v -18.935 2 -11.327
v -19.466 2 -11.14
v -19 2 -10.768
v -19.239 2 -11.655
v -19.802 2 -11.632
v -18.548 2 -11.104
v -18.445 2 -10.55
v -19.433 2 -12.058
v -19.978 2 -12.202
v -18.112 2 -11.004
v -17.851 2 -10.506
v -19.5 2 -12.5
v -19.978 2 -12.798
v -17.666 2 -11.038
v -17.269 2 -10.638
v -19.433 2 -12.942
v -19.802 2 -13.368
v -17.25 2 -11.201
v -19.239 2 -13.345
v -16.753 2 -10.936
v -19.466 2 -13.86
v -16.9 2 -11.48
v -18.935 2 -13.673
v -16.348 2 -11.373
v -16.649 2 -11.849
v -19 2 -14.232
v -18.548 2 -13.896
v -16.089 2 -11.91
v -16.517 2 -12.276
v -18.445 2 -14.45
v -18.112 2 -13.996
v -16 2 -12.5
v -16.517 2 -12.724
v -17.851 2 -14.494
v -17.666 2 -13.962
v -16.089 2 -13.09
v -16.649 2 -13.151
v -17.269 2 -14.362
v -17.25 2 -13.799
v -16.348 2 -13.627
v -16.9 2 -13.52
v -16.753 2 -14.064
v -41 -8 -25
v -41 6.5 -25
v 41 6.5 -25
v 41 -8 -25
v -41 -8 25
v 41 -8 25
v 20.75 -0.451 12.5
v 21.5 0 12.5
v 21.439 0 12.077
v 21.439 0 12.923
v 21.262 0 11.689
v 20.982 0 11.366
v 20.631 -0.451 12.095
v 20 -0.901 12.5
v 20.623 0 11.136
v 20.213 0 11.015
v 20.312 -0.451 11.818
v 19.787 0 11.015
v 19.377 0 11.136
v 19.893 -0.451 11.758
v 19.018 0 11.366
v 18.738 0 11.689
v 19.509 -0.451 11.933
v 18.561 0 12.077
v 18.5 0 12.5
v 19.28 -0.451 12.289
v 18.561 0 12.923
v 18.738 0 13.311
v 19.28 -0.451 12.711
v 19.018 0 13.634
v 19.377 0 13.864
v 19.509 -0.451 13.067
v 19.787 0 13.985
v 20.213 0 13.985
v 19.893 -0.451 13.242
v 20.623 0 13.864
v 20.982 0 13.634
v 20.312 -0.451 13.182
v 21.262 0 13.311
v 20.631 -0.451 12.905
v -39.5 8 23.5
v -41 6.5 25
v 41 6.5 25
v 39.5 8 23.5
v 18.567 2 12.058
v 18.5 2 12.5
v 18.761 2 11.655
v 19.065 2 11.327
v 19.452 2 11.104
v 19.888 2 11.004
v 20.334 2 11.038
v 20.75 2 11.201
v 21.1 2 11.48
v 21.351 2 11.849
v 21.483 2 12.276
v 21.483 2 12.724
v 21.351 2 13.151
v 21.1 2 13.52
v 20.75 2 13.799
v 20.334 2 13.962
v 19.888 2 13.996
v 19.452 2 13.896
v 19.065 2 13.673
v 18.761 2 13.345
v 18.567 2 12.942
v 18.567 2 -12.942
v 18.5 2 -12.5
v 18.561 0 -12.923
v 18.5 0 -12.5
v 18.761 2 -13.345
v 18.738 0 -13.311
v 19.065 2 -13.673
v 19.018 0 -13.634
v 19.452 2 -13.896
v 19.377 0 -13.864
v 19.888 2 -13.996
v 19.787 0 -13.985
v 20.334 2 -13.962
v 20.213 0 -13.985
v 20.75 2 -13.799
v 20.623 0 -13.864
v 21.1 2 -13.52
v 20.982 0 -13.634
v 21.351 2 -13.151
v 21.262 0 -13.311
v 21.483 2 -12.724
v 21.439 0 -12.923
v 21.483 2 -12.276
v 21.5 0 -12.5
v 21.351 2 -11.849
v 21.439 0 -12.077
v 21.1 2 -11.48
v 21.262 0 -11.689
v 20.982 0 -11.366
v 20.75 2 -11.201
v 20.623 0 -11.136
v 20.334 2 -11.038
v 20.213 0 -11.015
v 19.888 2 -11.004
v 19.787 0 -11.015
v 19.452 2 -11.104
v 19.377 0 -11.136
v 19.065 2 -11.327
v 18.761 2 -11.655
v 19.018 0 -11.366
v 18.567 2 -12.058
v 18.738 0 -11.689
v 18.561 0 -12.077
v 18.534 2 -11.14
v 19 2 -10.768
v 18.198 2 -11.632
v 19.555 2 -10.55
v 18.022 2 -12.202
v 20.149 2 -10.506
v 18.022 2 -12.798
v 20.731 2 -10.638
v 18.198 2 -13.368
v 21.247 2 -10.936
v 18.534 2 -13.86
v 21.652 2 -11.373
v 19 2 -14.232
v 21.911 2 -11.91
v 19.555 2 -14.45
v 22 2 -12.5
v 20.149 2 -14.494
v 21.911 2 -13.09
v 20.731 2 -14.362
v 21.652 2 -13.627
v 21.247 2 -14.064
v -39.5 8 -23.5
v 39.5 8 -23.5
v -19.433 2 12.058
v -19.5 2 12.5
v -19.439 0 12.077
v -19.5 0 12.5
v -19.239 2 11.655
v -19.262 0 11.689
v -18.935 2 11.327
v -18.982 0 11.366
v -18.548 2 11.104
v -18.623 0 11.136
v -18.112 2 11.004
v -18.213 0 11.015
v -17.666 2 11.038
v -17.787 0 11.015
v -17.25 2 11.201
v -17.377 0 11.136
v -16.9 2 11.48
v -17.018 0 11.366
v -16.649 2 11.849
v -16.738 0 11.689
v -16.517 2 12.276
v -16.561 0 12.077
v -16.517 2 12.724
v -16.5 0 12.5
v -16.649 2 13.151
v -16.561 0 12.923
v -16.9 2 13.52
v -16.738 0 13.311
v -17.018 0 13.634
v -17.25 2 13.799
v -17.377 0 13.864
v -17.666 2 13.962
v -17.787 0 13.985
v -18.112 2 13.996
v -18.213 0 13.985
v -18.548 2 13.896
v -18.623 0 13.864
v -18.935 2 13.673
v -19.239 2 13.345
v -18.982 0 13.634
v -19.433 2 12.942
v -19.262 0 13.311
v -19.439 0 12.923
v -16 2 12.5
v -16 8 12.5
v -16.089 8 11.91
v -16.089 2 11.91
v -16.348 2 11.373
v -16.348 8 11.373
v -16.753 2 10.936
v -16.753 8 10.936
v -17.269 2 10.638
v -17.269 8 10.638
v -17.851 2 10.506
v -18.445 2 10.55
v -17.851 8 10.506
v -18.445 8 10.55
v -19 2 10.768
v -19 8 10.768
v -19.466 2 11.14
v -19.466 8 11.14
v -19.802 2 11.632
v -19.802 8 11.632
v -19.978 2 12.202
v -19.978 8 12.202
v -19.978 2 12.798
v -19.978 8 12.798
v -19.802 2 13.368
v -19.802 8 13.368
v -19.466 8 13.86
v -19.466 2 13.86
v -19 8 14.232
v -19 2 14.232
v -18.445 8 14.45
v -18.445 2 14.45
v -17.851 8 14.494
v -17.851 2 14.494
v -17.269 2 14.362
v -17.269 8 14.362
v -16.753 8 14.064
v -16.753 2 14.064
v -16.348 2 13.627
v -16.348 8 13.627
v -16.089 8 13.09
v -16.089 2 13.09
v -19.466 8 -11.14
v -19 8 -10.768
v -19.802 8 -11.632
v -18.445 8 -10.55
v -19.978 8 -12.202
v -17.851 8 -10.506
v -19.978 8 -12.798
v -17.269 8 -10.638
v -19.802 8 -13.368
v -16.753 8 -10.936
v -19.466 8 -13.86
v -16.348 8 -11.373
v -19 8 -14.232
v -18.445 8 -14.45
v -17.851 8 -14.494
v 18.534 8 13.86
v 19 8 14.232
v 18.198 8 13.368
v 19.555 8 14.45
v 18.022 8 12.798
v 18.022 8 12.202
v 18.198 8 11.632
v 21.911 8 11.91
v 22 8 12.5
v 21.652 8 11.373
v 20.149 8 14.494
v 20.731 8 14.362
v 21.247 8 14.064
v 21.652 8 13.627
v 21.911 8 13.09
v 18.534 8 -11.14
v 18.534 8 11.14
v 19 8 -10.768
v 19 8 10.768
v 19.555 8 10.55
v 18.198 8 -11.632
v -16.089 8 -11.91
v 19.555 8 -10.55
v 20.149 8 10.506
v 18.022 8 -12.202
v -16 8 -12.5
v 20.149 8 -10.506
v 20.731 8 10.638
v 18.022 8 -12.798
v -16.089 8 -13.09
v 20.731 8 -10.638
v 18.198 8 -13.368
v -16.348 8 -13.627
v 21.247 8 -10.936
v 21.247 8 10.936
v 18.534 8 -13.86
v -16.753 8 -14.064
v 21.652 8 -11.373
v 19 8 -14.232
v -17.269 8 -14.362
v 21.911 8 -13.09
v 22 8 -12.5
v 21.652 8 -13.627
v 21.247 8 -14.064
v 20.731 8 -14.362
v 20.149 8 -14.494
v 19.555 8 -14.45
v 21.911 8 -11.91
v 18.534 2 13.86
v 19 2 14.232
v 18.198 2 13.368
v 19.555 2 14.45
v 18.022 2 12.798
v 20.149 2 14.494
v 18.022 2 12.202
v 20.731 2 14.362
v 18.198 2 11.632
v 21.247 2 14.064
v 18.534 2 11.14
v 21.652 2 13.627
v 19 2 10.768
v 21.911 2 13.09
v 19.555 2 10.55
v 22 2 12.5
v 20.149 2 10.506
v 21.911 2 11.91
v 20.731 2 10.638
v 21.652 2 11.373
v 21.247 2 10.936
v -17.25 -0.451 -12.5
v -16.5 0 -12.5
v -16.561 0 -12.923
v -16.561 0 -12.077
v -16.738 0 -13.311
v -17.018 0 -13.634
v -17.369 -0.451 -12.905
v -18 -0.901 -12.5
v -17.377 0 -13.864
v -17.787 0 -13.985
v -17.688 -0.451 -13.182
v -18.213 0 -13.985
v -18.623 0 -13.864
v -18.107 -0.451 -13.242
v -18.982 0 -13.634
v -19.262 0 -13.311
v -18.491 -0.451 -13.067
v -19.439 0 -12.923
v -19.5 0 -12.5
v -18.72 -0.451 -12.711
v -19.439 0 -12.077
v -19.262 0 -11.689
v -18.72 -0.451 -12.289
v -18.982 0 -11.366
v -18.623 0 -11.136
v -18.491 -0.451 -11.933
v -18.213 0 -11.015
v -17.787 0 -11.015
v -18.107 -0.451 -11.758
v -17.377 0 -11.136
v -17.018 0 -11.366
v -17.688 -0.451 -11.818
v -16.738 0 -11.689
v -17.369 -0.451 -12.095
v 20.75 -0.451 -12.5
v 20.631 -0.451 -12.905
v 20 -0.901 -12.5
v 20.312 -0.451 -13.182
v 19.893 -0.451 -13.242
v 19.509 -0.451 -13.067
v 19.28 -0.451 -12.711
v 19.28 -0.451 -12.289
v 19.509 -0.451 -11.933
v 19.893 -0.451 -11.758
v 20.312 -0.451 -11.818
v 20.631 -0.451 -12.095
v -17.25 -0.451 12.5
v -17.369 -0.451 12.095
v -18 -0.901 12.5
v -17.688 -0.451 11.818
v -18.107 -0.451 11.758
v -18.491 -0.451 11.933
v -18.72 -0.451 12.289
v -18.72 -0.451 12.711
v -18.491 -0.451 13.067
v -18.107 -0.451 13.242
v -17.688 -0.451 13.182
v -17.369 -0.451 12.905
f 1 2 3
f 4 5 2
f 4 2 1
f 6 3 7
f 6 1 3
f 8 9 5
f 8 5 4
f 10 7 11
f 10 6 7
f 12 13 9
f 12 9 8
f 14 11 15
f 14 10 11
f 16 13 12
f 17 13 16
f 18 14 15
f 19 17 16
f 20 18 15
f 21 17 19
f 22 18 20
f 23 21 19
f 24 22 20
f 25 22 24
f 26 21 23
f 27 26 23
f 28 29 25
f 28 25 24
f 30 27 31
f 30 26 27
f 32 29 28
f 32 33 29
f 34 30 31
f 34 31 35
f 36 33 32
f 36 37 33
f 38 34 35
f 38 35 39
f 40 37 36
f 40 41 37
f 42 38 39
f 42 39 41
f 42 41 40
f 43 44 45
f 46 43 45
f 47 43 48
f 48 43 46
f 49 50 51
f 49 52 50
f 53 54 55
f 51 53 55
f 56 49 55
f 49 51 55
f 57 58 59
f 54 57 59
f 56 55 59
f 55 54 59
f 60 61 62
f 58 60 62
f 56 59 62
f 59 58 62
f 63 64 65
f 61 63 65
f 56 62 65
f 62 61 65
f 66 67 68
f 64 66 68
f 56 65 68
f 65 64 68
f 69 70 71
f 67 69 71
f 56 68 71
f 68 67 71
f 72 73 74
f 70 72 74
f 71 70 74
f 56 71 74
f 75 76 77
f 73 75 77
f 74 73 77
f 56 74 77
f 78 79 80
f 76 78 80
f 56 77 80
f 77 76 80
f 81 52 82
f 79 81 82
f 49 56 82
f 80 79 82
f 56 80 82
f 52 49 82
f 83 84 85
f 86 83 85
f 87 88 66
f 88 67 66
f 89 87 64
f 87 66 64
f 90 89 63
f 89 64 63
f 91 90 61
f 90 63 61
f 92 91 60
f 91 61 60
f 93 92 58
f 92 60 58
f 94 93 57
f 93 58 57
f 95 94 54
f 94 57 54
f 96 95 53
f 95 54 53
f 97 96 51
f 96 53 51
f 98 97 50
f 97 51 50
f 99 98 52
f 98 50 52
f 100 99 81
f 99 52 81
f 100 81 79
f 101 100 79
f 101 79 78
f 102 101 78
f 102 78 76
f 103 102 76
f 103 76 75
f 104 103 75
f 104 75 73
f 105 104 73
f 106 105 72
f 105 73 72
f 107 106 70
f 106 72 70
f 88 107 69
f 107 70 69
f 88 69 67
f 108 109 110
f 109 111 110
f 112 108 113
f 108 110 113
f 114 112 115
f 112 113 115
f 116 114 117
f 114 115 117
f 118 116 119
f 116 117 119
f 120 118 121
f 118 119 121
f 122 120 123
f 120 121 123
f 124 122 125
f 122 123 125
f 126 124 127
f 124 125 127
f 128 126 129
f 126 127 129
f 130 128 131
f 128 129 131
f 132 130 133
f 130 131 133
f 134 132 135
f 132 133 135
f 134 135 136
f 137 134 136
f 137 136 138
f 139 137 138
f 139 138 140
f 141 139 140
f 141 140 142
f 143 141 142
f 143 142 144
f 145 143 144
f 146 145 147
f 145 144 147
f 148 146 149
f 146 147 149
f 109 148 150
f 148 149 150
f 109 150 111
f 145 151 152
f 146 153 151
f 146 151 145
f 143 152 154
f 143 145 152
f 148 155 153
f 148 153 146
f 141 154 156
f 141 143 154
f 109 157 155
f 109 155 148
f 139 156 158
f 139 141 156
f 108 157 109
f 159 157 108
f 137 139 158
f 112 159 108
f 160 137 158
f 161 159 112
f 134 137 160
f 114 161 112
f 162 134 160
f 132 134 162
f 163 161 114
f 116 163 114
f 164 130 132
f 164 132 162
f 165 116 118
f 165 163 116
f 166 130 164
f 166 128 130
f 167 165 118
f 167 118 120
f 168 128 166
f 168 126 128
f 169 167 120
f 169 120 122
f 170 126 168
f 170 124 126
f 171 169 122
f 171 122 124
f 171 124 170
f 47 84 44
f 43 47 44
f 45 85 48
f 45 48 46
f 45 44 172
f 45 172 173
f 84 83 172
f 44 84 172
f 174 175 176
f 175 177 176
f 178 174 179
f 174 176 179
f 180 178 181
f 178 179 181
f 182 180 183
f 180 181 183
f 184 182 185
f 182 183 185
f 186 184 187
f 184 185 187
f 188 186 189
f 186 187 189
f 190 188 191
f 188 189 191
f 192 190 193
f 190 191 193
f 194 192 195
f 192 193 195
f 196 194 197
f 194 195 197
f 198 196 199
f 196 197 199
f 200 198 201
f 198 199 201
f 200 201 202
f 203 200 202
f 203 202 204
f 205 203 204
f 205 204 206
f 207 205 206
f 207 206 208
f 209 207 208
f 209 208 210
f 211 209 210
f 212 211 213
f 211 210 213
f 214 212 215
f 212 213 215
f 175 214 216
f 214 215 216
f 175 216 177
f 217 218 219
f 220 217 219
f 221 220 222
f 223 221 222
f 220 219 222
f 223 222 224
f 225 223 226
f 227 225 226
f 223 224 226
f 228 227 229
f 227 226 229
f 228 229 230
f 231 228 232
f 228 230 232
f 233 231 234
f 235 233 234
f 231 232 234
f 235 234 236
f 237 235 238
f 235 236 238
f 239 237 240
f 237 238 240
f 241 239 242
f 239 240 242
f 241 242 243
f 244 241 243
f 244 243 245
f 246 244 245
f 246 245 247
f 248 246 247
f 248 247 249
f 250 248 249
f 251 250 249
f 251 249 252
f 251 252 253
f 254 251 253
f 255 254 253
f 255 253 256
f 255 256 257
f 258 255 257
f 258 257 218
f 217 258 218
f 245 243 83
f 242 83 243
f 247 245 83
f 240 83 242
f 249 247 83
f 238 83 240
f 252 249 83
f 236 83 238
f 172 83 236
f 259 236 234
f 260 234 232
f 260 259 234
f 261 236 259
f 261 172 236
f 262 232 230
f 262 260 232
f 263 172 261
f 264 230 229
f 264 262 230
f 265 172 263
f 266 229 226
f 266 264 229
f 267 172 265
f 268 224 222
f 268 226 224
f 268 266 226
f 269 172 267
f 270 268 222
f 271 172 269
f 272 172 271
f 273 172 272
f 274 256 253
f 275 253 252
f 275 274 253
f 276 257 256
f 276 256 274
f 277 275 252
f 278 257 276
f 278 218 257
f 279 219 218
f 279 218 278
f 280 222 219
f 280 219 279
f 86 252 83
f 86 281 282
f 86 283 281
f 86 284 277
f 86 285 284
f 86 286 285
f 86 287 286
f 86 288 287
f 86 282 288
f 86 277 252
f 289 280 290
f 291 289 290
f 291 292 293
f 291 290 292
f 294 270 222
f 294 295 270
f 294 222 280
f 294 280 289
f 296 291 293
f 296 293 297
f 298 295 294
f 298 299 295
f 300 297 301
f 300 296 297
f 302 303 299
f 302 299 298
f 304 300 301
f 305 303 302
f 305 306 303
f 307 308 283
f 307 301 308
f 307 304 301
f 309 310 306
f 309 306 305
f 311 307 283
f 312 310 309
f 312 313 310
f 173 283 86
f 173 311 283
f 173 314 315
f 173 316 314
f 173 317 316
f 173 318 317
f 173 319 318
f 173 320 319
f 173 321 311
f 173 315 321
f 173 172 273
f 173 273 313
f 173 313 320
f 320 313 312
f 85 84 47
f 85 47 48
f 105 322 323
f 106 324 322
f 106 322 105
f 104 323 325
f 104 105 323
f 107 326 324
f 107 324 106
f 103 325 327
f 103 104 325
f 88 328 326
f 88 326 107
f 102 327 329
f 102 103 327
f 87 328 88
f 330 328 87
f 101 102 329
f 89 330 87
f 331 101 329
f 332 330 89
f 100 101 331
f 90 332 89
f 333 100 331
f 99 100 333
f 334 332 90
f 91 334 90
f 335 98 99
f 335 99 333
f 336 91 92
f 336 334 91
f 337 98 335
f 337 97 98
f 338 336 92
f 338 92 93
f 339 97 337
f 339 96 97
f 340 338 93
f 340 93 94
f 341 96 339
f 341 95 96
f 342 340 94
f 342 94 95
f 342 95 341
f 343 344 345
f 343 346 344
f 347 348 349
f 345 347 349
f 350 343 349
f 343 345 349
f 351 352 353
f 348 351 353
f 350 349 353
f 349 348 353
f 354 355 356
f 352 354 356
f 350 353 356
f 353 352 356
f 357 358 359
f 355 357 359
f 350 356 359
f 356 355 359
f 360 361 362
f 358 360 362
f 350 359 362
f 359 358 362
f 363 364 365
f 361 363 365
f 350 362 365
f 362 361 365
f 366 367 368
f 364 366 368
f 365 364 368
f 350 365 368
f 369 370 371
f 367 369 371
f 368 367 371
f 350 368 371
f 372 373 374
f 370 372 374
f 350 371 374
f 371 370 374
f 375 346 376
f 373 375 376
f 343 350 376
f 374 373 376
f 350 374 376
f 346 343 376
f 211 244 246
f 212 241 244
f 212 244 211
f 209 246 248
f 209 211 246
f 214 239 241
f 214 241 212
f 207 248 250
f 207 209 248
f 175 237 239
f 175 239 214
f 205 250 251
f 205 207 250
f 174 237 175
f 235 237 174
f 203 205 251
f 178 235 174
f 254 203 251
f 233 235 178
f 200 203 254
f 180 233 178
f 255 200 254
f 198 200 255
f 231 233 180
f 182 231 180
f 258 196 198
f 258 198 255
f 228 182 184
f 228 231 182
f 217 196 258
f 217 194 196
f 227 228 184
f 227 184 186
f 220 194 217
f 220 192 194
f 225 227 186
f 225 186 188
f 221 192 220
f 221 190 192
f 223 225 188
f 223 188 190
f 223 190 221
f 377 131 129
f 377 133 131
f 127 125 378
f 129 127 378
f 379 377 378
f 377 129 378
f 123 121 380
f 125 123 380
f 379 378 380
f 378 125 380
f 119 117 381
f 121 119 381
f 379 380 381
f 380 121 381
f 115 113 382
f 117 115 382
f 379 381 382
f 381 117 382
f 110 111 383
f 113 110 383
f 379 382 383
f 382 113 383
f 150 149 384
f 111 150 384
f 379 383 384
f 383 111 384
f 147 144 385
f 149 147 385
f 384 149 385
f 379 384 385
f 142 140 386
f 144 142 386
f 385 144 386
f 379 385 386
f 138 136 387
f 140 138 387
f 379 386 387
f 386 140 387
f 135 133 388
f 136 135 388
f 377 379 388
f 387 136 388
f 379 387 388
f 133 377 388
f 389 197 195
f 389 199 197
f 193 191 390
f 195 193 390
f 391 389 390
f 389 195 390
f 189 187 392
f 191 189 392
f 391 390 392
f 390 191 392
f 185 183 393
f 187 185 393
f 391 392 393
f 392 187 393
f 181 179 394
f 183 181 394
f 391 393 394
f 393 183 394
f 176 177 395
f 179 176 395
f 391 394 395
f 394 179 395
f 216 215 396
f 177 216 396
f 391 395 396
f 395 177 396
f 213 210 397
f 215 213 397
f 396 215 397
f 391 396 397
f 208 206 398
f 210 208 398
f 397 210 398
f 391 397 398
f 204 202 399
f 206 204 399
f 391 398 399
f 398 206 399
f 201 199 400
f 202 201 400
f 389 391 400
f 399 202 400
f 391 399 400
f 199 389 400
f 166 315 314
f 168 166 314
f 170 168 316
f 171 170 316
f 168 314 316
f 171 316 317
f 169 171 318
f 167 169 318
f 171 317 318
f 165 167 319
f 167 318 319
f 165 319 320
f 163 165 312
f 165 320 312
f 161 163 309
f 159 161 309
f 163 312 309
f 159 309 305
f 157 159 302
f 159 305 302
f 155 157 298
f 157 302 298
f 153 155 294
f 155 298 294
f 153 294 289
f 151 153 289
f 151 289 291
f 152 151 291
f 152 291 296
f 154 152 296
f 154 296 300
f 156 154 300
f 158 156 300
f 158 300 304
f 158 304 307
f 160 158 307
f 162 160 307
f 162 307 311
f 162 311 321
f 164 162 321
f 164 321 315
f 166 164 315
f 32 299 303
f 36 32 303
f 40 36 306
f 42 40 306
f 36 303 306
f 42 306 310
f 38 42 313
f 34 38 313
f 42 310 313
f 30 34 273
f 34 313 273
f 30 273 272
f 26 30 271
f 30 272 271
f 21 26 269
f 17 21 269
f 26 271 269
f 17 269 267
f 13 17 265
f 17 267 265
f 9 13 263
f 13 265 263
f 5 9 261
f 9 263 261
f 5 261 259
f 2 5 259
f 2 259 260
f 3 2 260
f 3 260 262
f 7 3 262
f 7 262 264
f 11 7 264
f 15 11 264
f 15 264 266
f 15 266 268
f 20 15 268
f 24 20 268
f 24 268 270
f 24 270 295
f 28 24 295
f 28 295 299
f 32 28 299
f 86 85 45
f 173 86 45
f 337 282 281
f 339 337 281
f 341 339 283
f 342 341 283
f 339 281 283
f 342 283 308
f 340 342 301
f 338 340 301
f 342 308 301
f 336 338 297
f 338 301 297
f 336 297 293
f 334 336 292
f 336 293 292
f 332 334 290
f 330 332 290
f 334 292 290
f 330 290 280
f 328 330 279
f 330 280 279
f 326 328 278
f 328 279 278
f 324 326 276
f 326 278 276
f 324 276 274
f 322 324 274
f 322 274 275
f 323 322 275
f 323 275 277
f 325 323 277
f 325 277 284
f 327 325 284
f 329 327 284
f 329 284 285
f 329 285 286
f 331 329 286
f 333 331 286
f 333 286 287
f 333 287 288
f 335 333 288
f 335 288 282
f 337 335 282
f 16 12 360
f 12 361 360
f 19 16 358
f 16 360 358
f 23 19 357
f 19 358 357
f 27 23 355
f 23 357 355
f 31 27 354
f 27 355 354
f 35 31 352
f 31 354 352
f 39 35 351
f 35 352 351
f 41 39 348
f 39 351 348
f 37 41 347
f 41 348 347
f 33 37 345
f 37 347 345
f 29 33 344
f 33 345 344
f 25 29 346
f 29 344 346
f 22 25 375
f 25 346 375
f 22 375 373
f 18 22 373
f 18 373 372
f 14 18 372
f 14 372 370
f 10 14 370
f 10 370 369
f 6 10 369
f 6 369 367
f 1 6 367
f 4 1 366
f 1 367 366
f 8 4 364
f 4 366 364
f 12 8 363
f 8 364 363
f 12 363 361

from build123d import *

# Parameters (mm, degrees)
SKETCH1_W                               = 82
SKETCH1_H                               = 50
BOSS_EXTRUDE1_DEPTH                     = 8
CHAMFER1_SIZE                           = 1.5
CBORE_FOR_M5_HEX_HEAD_BOLT1_D           = 3
CBORE_FOR_M5_HEX_HEAD_BOLT1_DEPTH       = 8
CBORE_FOR_M5_HEX_HEAD_BOLT1_CBORE_D     = 4
CBORE_FOR_M5_HEX_HEAD_BOLT1_CBORE_DEPTH = 6
CBORE_FOR_M5_HEX_HEAD_BOLT1_TIP         = 0.901290929


with BuildPart() as part:
    # Sketch1 → Boss-Extrude1 (new, symmetric)
    with BuildSketch(Plane(origin=(0, 0, 0), x_dir=(1, 0, 0), z_dir=(0, 1, 0))):
        Rectangle(SKETCH1_W, SKETCH1_H)
    extrude(amount=BOSS_EXTRUDE1_DEPTH, both=True)

    # Chamfer1
    chamfer1_edges = [part.edges().sort_by_distance(p)[0] for p in [
        (41, 8, 0),
        (0, 8, -25),
        (-41, 8, 0),
        (0, 8, 25),
    ]]
    chamfer(chamfer1_edges, length=CHAMFER1_SIZE)

    # CBORE for M5 Hex Head Bolt1
    with Locations(Plane(origin=(0, 8, 0), x_dir=(1, 0, 0), z_dir=(0, 1, 0))):
        with Locations((-18, 12.5), (-18, -12.5), (20, -12.5), (20, 12.5)):
            CounterBoreHole(CBORE_FOR_M5_HEX_HEAD_BOLT1_D / 2, CBORE_FOR_M5_HEX_HEAD_BOLT1_CBORE_D / 2, CBORE_FOR_M5_HEX_HEAD_BOLT1_CBORE_DEPTH, depth=CBORE_FOR_M5_HEX_HEAD_BOLT1_DEPTH)
            with Locations((0, 0, -(CBORE_FOR_M5_HEX_HEAD_BOLT1_DEPTH + CBORE_FOR_M5_HEX_HEAD_BOLT1_TIP / 2))):  # 118° drill point
                Cone(0, CBORE_FOR_M5_HEX_HEAD_BOLT1_D / 2, CBORE_FOR_M5_HEX_HEAD_BOLT1_TIP, mode=Mode.SUBTRACT)


solid = part.part
